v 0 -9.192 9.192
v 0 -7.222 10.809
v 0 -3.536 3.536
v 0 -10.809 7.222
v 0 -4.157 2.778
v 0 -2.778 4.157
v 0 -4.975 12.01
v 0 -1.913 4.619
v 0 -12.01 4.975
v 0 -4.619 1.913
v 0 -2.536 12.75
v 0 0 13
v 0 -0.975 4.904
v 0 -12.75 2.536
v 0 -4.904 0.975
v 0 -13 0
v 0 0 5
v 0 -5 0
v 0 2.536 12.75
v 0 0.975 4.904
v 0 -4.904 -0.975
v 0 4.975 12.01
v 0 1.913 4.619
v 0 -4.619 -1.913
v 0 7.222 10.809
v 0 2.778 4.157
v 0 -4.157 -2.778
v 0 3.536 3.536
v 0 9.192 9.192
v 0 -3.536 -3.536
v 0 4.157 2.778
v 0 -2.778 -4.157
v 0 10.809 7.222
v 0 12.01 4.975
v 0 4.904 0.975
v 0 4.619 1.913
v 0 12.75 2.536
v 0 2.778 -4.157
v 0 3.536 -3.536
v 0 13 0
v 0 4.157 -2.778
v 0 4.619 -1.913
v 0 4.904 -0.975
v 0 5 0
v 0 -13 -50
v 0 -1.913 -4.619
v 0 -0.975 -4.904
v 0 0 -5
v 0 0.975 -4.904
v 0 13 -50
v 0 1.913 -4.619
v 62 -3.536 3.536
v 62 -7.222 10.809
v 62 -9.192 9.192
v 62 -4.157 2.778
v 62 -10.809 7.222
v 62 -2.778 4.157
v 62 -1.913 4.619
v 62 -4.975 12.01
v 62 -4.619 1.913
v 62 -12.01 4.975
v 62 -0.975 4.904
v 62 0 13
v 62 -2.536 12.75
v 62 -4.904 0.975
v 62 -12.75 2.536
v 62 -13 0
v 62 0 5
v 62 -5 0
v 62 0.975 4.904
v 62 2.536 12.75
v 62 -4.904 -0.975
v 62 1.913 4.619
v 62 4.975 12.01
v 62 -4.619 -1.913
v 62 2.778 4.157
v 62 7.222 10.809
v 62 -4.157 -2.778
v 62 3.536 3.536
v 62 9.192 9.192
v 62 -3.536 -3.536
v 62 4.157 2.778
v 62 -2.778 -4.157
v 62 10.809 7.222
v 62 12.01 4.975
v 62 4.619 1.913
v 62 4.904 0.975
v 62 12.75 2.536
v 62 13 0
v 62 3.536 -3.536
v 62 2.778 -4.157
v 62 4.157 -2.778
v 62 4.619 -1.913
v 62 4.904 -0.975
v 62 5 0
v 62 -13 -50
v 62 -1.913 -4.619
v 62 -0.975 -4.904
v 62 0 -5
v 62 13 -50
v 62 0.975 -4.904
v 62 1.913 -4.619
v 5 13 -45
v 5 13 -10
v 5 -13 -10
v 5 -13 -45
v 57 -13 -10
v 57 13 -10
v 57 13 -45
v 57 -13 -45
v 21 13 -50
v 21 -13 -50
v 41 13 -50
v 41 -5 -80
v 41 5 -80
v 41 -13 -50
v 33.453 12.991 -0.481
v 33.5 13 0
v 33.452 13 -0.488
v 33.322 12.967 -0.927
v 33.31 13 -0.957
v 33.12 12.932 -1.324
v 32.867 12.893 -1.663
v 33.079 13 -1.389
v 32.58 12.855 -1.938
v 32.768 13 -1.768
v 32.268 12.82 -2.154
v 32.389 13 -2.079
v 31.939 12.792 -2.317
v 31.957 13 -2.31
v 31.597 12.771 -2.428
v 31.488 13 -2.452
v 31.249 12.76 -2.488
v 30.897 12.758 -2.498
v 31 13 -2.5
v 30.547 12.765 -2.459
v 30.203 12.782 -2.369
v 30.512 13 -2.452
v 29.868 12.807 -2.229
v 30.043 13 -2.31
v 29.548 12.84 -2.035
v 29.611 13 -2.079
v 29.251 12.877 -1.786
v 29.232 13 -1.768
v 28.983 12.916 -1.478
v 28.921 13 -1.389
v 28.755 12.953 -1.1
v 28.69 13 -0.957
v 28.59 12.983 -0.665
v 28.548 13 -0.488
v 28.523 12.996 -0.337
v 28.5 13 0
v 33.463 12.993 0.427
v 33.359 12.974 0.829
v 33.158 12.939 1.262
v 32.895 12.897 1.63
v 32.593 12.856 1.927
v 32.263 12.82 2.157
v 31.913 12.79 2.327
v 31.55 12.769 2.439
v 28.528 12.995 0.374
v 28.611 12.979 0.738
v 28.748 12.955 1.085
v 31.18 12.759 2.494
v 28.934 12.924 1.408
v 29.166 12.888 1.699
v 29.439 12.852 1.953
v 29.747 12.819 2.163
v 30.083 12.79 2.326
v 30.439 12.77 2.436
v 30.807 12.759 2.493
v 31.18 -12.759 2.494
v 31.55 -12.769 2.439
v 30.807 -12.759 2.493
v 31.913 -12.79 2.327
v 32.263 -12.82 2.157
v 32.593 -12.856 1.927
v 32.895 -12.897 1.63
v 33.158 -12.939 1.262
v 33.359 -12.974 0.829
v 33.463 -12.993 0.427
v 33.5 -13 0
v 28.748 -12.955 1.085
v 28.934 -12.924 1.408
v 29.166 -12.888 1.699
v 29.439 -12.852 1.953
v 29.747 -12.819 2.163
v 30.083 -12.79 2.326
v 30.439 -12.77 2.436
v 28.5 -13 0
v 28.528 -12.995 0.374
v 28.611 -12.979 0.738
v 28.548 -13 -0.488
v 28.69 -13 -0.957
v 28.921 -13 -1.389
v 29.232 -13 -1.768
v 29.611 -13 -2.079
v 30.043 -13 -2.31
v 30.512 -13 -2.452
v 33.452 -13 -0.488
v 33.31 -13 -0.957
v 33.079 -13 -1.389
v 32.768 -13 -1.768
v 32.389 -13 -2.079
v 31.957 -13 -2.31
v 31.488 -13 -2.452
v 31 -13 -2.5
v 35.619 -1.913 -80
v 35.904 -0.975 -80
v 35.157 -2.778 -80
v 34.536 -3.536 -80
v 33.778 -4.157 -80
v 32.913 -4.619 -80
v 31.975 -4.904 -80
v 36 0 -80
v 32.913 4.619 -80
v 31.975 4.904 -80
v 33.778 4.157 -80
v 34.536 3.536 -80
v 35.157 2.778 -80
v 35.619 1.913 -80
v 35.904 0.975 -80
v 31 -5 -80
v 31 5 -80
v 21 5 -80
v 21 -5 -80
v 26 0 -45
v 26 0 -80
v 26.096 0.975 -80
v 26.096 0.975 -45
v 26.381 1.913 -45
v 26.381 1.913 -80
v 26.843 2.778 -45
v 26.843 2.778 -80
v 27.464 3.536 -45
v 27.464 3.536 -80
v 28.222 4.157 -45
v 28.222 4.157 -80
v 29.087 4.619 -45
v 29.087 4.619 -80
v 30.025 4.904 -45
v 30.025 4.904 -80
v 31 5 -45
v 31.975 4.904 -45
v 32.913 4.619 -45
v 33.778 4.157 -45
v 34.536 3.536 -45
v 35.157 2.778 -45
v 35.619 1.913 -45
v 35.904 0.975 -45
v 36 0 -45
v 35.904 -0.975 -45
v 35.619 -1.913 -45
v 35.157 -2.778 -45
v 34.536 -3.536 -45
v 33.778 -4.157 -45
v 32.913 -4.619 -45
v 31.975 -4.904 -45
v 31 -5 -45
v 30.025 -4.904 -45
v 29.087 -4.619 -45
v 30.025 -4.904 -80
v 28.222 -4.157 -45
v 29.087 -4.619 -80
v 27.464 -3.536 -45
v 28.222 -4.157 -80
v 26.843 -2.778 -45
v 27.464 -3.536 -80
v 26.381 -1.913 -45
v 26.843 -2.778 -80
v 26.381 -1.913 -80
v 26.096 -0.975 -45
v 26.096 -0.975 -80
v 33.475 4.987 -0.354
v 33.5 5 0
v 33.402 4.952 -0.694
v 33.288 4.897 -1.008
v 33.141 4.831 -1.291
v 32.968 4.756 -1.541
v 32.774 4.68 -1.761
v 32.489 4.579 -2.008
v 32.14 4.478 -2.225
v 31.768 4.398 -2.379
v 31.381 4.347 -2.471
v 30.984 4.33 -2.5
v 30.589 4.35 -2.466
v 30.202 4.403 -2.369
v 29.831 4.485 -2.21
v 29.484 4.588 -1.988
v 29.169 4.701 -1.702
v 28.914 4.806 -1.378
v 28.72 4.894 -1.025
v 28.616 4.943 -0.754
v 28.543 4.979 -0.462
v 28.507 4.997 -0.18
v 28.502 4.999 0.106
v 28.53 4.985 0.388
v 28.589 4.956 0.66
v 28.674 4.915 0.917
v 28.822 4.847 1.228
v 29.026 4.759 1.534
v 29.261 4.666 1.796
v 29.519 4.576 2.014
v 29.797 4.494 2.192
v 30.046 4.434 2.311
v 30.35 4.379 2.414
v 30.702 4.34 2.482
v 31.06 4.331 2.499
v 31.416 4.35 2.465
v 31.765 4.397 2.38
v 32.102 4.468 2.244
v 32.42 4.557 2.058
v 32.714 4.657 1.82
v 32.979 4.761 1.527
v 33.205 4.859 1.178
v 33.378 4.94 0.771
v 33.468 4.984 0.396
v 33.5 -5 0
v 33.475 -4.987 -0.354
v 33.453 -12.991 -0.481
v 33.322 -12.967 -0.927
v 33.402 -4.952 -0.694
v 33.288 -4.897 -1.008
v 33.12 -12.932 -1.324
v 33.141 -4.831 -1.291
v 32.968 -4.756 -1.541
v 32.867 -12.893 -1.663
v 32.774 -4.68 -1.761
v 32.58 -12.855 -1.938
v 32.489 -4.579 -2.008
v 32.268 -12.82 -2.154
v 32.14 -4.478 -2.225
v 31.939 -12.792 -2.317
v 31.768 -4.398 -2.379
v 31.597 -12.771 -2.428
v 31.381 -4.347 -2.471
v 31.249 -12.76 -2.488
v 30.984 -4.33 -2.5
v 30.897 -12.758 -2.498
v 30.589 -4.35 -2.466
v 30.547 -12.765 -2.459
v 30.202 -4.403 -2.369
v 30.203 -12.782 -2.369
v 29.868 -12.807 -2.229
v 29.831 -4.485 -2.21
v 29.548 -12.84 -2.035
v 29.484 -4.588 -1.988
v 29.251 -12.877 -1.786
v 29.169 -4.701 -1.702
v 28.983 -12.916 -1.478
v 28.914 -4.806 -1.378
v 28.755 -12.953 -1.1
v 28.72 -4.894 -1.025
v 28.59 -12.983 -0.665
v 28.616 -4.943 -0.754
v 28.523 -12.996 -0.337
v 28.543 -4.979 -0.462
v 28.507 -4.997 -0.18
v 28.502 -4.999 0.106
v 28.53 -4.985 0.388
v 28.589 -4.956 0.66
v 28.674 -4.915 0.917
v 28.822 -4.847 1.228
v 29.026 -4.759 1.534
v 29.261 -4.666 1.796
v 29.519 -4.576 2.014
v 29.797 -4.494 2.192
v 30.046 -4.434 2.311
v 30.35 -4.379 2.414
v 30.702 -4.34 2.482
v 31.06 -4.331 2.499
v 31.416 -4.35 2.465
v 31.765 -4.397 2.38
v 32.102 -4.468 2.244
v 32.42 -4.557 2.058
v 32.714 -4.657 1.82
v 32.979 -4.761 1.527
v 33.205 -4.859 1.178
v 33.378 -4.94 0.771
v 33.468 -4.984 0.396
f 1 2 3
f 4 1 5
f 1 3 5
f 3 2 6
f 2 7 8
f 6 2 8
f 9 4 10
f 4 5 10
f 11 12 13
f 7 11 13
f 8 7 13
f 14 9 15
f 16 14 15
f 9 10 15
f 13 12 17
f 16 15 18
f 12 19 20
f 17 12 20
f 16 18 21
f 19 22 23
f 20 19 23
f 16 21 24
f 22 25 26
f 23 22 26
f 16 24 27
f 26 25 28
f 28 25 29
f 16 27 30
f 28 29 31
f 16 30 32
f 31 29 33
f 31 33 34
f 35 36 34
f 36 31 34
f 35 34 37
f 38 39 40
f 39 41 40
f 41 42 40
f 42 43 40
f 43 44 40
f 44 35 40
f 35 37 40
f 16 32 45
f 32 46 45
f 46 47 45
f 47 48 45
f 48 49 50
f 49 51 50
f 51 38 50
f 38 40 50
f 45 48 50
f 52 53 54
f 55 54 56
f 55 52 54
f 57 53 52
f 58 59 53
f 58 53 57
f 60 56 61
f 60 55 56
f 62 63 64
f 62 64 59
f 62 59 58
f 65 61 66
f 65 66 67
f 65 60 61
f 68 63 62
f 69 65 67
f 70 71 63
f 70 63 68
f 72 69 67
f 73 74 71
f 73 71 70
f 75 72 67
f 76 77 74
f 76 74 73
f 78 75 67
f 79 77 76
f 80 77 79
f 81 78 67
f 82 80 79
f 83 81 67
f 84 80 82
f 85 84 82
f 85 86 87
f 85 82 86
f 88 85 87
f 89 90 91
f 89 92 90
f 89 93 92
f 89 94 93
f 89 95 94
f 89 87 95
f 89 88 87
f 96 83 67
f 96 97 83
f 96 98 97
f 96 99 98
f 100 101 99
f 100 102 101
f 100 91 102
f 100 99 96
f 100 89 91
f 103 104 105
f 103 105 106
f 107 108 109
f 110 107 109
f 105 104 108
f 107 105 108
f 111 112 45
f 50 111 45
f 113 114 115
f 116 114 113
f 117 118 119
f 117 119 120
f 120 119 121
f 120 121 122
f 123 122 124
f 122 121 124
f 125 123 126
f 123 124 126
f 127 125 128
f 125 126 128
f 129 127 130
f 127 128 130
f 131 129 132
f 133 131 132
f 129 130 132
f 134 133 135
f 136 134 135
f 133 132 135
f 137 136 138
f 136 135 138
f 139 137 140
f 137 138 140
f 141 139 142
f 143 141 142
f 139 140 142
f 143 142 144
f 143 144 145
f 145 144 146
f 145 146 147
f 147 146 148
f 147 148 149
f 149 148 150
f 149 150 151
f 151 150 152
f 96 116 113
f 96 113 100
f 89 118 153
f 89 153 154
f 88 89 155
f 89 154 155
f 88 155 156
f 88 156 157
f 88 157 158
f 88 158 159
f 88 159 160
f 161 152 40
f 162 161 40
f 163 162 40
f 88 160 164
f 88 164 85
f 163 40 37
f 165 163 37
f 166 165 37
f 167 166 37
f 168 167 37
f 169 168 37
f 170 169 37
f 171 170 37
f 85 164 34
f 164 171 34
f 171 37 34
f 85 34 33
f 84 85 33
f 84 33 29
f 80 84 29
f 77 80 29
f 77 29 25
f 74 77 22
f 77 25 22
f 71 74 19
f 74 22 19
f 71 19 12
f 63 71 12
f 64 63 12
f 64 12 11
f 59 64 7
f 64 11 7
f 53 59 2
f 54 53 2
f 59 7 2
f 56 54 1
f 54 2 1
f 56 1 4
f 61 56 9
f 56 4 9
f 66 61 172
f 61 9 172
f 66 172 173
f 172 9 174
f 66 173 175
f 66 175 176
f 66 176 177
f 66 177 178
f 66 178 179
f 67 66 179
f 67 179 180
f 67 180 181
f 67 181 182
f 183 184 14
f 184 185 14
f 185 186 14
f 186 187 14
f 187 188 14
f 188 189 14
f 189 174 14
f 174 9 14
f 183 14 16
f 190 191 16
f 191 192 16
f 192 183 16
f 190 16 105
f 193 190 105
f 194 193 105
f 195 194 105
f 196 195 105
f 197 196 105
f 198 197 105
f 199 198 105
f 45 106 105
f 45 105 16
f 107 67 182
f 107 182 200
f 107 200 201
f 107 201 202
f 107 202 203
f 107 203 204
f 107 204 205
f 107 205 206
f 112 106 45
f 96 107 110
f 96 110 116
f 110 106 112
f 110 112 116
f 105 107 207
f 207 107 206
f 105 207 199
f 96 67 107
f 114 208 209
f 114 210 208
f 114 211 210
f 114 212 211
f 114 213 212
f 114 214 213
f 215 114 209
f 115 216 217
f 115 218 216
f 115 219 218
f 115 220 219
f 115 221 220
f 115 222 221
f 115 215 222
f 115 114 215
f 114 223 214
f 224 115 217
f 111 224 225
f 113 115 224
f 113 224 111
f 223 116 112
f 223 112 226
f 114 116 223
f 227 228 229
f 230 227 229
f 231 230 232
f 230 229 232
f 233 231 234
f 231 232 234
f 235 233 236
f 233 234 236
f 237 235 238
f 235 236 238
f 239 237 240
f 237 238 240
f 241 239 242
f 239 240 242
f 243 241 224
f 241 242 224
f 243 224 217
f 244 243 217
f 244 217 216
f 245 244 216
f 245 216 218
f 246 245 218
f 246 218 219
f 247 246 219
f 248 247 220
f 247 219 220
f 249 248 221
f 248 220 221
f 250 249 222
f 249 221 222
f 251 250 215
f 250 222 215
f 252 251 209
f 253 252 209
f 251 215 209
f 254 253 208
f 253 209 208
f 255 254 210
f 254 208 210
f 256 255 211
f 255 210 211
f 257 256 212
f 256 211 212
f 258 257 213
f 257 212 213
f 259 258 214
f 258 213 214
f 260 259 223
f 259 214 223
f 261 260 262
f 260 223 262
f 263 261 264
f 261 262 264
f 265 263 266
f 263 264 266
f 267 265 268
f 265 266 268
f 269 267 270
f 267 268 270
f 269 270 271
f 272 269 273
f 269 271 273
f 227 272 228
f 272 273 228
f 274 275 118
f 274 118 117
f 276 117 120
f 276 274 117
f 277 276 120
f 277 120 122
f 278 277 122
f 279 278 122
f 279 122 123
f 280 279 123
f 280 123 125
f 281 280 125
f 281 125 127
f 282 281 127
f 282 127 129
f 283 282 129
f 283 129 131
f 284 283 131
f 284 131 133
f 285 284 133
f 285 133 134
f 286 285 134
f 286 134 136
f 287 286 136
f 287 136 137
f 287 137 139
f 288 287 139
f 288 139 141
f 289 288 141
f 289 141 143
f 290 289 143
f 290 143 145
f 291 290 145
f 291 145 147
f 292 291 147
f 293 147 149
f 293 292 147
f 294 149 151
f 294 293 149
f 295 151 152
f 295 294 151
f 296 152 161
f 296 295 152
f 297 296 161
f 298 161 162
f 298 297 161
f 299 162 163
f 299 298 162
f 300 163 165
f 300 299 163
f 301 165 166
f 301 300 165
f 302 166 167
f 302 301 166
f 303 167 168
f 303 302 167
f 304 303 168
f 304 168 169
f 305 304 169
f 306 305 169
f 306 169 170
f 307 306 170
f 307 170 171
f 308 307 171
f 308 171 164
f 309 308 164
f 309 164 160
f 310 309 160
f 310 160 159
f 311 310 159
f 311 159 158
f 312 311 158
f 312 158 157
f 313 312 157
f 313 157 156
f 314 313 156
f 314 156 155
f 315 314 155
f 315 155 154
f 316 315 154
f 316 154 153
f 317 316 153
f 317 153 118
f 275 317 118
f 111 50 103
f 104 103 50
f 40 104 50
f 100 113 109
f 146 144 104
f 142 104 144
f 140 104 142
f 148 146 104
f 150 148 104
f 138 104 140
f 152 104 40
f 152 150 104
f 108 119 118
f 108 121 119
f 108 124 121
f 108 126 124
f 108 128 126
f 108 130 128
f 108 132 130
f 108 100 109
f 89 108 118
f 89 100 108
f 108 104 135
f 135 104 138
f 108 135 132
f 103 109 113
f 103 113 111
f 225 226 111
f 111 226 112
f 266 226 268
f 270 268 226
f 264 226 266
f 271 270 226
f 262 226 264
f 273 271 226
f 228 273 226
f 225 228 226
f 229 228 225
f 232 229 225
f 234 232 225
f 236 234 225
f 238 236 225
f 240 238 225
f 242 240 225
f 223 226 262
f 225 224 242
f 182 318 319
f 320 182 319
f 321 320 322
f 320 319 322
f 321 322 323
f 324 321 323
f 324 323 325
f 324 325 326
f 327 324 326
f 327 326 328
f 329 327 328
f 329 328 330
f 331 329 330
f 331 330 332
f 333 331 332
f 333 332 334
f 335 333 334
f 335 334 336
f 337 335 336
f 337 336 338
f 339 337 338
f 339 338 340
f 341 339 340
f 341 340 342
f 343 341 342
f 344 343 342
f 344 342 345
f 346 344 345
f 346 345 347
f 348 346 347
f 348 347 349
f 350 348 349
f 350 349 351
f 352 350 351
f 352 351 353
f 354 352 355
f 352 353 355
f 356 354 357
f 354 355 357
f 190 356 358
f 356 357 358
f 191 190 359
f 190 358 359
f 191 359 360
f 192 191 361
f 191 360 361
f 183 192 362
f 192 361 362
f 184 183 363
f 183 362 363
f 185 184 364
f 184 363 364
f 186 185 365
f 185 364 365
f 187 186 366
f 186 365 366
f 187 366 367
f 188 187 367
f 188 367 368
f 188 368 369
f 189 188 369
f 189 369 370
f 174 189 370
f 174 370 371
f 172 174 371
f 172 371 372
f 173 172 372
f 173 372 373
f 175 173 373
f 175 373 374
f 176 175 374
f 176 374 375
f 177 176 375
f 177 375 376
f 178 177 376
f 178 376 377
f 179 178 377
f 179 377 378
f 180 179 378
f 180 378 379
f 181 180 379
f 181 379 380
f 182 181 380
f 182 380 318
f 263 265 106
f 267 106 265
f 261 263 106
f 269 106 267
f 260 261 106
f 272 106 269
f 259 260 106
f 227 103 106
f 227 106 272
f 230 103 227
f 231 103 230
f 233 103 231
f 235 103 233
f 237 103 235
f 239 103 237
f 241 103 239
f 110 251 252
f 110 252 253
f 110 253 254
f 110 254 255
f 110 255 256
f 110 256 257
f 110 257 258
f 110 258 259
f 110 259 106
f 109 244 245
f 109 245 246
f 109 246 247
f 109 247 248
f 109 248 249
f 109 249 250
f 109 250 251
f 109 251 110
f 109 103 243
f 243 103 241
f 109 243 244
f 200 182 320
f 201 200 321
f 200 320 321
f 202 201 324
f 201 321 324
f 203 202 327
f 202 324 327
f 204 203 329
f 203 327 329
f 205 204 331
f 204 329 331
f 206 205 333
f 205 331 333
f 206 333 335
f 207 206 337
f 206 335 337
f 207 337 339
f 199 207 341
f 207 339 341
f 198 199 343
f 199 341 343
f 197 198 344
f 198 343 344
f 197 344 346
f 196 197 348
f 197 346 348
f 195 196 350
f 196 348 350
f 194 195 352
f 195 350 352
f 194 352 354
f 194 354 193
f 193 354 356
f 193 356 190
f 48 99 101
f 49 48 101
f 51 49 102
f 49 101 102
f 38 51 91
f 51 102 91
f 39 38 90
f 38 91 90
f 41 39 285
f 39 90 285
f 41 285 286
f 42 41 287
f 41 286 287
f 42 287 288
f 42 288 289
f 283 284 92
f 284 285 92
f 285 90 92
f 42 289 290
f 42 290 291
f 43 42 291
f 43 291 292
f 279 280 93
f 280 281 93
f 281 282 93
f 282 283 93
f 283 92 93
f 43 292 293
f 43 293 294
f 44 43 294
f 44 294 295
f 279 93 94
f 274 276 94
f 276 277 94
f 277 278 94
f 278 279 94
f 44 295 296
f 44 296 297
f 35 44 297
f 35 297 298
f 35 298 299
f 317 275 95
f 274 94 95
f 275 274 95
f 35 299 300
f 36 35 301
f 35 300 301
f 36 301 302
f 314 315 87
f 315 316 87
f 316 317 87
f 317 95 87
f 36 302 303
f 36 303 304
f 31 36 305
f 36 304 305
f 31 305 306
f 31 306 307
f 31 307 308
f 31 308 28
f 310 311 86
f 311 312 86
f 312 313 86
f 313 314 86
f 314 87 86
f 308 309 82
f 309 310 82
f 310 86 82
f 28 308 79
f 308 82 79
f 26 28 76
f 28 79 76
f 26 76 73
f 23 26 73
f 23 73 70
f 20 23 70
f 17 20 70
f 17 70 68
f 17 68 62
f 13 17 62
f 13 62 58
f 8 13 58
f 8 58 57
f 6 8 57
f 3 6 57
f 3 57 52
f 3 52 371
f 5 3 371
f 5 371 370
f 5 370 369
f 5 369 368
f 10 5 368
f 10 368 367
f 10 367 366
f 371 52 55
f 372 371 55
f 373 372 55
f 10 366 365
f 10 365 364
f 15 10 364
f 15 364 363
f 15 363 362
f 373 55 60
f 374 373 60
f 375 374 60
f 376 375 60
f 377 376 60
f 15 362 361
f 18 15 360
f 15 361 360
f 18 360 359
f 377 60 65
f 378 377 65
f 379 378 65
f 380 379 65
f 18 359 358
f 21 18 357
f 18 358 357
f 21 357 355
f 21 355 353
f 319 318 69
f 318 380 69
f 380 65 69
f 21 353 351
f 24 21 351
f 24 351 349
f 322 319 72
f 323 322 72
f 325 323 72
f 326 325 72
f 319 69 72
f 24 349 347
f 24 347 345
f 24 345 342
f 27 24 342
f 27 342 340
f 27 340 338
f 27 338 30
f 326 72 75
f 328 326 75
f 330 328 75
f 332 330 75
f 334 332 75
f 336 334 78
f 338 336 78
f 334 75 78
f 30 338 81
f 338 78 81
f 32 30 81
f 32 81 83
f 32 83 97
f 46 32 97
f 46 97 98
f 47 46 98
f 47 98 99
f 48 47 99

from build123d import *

# Parameters (mm, degrees)
CROQUIS1_R                 = 13
SALIENTE_EXTRUIR1_DEPTH    = 62
CROQUIS2_R                 = 5
CORTAR_EXTRUIR1_DEPTH      = 62
CORTAR_EXTRUIR2_DEPTH      = 62
CORTAR_EXTRUIR2_DEPTH_BACK = 62
CROQUIS3_R                 = 2.5
SALIENTE_EXTRUIR2_START    = -62
SALIENTE_EXTRUIR2_DEPTH    = 62
CROQUIS5_W                 = 52
CROQUIS5_H                 = 35
CORTAR_EXTRUIR4_DEPTH      = 62
CROQUIS6_R                 = 2.5
CORTAR_EXTRUIR5_DEPTH      = 62
CROQUIS7_R                 = 5
CORTAR_EXTRUIR6_DEPTH      = 62
CORTAR_EXTRUIR8_DEPTH      = 62
CORTAR_EXTRUIR8_DEPTH_BACK = 62
CROQUIS8_W                 = 21
CROQUIS8_H                 = 30


with BuildPart() as part:
    # Croquis1 → Saliente-Extruir1 (new body)
    with BuildSketch(Plane(origin=(0, 0, 0), x_dir=(0, 0, -1), z_dir=(1, 0, 0))):
        Circle(CROQUIS1_R)
    extrude(amount=SALIENTE_EXTRUIR1_DEPTH)

    # Croquis2 → Cortar-Extruir1 (cut)
    with BuildSketch(Plane(origin=(62, 0, 0), x_dir=(0, 0, -1), z_dir=(1, 0, 0))):
        Circle(CROQUIS2_R)
    extrude(amount=-CORTAR_EXTRUIR1_DEPTH, mode=Mode.SUBTRACT)

    # Croquis3 → Cortar-Extruir2 (cut, two sides: drawn at the far end of the back side and taken through both)
    with BuildSketch(Plane(origin=(0, 0, 0), x_dir=(1, 0, 0), z_dir=(0, 1, 0)).offset(-CORTAR_EXTRUIR2_DEPTH_BACK)):
        with Locations((31, 0)):
            Circle(CROQUIS3_R)
    extrude(amount=CORTAR_EXTRUIR2_DEPTH + CORTAR_EXTRUIR2_DEPTH_BACK, mode=Mode.SUBTRACT)

    # Croquis4 → Saliente-Extruir2 (add)
    with BuildSketch(Plane(origin=(62, 0, 0), x_dir=(0, 0, -1), z_dir=(1, 0, 0)).offset(SALIENTE_EXTRUIR2_START)):
        with BuildLine():
            Line((50, 13), (0, 13))
            ThreePointArc((0, 13), (9.192388155, 9.192388155), (13, 0))
            ThreePointArc((13, 0), (9.192388155, -9.192388155), (0, -13))
            Line((0, -13), (50, -13))
            Line((50, -13), (80, -5))
            Line((80, -5), (80, 0))
            Line((80, 0), (80, 5))
            Line((80, 5), (50, 13))
        make_face()
    extrude(amount=SALIENTE_EXTRUIR2_DEPTH)

    # Croquis5 → Cortar-Extruir4 (cut)
    with BuildSketch(Plane(origin=(0, 13, 0), x_dir=(1, 0, 0), z_dir=(0, 1, 0))):
        with Locations((31, 27.5)):
            Rectangle(CROQUIS5_W, CROQUIS5_H)
    extrude(amount=-CORTAR_EXTRUIR4_DEPTH, mode=Mode.SUBTRACT)

    # Croquis6 → Cortar-Extruir5 (cut)
    with BuildSketch(Plane(origin=(0, 13, 0), x_dir=(1, 0, 0), z_dir=(0, 1, 0))):
        with Locations((31, 0)):
            Circle(CROQUIS6_R)
    extrude(amount=-CORTAR_EXTRUIR5_DEPTH, mode=Mode.SUBTRACT)

    # Croquis7 → Cortar-Extruir6 (cut)
    with BuildSketch(Plane(origin=(0, 0, -80), x_dir=(-1, 0, 0), z_dir=(0, 0, -1))):
        with Locations((-31, 0)):
            Circle(CROQUIS7_R)
    extrude(amount=-CORTAR_EXTRUIR6_DEPTH, mode=Mode.SUBTRACT)

    # Croquis8 → Cortar-Extruir8 (cut, two sides: drawn at the far end of the back side and taken through both)
    with BuildSketch(Plane(origin=(0, 0, 0), x_dir=(1, 0, 0), z_dir=(0, 1, 0)).offset(-CORTAR_EXTRUIR8_DEPTH_BACK)):
        with Locations((51.5, 65)):
            Rectangle(CROQUIS8_W, CROQUIS8_H)
        with Locations((10.5, 65)):
            Rectangle(CROQUIS8_W, CROQUIS8_H)
    extrude(amount=CORTAR_EXTRUIR8_DEPTH + CORTAR_EXTRUIR8_DEPTH_BACK, mode=Mode.SUBTRACT)


solid = part.part
